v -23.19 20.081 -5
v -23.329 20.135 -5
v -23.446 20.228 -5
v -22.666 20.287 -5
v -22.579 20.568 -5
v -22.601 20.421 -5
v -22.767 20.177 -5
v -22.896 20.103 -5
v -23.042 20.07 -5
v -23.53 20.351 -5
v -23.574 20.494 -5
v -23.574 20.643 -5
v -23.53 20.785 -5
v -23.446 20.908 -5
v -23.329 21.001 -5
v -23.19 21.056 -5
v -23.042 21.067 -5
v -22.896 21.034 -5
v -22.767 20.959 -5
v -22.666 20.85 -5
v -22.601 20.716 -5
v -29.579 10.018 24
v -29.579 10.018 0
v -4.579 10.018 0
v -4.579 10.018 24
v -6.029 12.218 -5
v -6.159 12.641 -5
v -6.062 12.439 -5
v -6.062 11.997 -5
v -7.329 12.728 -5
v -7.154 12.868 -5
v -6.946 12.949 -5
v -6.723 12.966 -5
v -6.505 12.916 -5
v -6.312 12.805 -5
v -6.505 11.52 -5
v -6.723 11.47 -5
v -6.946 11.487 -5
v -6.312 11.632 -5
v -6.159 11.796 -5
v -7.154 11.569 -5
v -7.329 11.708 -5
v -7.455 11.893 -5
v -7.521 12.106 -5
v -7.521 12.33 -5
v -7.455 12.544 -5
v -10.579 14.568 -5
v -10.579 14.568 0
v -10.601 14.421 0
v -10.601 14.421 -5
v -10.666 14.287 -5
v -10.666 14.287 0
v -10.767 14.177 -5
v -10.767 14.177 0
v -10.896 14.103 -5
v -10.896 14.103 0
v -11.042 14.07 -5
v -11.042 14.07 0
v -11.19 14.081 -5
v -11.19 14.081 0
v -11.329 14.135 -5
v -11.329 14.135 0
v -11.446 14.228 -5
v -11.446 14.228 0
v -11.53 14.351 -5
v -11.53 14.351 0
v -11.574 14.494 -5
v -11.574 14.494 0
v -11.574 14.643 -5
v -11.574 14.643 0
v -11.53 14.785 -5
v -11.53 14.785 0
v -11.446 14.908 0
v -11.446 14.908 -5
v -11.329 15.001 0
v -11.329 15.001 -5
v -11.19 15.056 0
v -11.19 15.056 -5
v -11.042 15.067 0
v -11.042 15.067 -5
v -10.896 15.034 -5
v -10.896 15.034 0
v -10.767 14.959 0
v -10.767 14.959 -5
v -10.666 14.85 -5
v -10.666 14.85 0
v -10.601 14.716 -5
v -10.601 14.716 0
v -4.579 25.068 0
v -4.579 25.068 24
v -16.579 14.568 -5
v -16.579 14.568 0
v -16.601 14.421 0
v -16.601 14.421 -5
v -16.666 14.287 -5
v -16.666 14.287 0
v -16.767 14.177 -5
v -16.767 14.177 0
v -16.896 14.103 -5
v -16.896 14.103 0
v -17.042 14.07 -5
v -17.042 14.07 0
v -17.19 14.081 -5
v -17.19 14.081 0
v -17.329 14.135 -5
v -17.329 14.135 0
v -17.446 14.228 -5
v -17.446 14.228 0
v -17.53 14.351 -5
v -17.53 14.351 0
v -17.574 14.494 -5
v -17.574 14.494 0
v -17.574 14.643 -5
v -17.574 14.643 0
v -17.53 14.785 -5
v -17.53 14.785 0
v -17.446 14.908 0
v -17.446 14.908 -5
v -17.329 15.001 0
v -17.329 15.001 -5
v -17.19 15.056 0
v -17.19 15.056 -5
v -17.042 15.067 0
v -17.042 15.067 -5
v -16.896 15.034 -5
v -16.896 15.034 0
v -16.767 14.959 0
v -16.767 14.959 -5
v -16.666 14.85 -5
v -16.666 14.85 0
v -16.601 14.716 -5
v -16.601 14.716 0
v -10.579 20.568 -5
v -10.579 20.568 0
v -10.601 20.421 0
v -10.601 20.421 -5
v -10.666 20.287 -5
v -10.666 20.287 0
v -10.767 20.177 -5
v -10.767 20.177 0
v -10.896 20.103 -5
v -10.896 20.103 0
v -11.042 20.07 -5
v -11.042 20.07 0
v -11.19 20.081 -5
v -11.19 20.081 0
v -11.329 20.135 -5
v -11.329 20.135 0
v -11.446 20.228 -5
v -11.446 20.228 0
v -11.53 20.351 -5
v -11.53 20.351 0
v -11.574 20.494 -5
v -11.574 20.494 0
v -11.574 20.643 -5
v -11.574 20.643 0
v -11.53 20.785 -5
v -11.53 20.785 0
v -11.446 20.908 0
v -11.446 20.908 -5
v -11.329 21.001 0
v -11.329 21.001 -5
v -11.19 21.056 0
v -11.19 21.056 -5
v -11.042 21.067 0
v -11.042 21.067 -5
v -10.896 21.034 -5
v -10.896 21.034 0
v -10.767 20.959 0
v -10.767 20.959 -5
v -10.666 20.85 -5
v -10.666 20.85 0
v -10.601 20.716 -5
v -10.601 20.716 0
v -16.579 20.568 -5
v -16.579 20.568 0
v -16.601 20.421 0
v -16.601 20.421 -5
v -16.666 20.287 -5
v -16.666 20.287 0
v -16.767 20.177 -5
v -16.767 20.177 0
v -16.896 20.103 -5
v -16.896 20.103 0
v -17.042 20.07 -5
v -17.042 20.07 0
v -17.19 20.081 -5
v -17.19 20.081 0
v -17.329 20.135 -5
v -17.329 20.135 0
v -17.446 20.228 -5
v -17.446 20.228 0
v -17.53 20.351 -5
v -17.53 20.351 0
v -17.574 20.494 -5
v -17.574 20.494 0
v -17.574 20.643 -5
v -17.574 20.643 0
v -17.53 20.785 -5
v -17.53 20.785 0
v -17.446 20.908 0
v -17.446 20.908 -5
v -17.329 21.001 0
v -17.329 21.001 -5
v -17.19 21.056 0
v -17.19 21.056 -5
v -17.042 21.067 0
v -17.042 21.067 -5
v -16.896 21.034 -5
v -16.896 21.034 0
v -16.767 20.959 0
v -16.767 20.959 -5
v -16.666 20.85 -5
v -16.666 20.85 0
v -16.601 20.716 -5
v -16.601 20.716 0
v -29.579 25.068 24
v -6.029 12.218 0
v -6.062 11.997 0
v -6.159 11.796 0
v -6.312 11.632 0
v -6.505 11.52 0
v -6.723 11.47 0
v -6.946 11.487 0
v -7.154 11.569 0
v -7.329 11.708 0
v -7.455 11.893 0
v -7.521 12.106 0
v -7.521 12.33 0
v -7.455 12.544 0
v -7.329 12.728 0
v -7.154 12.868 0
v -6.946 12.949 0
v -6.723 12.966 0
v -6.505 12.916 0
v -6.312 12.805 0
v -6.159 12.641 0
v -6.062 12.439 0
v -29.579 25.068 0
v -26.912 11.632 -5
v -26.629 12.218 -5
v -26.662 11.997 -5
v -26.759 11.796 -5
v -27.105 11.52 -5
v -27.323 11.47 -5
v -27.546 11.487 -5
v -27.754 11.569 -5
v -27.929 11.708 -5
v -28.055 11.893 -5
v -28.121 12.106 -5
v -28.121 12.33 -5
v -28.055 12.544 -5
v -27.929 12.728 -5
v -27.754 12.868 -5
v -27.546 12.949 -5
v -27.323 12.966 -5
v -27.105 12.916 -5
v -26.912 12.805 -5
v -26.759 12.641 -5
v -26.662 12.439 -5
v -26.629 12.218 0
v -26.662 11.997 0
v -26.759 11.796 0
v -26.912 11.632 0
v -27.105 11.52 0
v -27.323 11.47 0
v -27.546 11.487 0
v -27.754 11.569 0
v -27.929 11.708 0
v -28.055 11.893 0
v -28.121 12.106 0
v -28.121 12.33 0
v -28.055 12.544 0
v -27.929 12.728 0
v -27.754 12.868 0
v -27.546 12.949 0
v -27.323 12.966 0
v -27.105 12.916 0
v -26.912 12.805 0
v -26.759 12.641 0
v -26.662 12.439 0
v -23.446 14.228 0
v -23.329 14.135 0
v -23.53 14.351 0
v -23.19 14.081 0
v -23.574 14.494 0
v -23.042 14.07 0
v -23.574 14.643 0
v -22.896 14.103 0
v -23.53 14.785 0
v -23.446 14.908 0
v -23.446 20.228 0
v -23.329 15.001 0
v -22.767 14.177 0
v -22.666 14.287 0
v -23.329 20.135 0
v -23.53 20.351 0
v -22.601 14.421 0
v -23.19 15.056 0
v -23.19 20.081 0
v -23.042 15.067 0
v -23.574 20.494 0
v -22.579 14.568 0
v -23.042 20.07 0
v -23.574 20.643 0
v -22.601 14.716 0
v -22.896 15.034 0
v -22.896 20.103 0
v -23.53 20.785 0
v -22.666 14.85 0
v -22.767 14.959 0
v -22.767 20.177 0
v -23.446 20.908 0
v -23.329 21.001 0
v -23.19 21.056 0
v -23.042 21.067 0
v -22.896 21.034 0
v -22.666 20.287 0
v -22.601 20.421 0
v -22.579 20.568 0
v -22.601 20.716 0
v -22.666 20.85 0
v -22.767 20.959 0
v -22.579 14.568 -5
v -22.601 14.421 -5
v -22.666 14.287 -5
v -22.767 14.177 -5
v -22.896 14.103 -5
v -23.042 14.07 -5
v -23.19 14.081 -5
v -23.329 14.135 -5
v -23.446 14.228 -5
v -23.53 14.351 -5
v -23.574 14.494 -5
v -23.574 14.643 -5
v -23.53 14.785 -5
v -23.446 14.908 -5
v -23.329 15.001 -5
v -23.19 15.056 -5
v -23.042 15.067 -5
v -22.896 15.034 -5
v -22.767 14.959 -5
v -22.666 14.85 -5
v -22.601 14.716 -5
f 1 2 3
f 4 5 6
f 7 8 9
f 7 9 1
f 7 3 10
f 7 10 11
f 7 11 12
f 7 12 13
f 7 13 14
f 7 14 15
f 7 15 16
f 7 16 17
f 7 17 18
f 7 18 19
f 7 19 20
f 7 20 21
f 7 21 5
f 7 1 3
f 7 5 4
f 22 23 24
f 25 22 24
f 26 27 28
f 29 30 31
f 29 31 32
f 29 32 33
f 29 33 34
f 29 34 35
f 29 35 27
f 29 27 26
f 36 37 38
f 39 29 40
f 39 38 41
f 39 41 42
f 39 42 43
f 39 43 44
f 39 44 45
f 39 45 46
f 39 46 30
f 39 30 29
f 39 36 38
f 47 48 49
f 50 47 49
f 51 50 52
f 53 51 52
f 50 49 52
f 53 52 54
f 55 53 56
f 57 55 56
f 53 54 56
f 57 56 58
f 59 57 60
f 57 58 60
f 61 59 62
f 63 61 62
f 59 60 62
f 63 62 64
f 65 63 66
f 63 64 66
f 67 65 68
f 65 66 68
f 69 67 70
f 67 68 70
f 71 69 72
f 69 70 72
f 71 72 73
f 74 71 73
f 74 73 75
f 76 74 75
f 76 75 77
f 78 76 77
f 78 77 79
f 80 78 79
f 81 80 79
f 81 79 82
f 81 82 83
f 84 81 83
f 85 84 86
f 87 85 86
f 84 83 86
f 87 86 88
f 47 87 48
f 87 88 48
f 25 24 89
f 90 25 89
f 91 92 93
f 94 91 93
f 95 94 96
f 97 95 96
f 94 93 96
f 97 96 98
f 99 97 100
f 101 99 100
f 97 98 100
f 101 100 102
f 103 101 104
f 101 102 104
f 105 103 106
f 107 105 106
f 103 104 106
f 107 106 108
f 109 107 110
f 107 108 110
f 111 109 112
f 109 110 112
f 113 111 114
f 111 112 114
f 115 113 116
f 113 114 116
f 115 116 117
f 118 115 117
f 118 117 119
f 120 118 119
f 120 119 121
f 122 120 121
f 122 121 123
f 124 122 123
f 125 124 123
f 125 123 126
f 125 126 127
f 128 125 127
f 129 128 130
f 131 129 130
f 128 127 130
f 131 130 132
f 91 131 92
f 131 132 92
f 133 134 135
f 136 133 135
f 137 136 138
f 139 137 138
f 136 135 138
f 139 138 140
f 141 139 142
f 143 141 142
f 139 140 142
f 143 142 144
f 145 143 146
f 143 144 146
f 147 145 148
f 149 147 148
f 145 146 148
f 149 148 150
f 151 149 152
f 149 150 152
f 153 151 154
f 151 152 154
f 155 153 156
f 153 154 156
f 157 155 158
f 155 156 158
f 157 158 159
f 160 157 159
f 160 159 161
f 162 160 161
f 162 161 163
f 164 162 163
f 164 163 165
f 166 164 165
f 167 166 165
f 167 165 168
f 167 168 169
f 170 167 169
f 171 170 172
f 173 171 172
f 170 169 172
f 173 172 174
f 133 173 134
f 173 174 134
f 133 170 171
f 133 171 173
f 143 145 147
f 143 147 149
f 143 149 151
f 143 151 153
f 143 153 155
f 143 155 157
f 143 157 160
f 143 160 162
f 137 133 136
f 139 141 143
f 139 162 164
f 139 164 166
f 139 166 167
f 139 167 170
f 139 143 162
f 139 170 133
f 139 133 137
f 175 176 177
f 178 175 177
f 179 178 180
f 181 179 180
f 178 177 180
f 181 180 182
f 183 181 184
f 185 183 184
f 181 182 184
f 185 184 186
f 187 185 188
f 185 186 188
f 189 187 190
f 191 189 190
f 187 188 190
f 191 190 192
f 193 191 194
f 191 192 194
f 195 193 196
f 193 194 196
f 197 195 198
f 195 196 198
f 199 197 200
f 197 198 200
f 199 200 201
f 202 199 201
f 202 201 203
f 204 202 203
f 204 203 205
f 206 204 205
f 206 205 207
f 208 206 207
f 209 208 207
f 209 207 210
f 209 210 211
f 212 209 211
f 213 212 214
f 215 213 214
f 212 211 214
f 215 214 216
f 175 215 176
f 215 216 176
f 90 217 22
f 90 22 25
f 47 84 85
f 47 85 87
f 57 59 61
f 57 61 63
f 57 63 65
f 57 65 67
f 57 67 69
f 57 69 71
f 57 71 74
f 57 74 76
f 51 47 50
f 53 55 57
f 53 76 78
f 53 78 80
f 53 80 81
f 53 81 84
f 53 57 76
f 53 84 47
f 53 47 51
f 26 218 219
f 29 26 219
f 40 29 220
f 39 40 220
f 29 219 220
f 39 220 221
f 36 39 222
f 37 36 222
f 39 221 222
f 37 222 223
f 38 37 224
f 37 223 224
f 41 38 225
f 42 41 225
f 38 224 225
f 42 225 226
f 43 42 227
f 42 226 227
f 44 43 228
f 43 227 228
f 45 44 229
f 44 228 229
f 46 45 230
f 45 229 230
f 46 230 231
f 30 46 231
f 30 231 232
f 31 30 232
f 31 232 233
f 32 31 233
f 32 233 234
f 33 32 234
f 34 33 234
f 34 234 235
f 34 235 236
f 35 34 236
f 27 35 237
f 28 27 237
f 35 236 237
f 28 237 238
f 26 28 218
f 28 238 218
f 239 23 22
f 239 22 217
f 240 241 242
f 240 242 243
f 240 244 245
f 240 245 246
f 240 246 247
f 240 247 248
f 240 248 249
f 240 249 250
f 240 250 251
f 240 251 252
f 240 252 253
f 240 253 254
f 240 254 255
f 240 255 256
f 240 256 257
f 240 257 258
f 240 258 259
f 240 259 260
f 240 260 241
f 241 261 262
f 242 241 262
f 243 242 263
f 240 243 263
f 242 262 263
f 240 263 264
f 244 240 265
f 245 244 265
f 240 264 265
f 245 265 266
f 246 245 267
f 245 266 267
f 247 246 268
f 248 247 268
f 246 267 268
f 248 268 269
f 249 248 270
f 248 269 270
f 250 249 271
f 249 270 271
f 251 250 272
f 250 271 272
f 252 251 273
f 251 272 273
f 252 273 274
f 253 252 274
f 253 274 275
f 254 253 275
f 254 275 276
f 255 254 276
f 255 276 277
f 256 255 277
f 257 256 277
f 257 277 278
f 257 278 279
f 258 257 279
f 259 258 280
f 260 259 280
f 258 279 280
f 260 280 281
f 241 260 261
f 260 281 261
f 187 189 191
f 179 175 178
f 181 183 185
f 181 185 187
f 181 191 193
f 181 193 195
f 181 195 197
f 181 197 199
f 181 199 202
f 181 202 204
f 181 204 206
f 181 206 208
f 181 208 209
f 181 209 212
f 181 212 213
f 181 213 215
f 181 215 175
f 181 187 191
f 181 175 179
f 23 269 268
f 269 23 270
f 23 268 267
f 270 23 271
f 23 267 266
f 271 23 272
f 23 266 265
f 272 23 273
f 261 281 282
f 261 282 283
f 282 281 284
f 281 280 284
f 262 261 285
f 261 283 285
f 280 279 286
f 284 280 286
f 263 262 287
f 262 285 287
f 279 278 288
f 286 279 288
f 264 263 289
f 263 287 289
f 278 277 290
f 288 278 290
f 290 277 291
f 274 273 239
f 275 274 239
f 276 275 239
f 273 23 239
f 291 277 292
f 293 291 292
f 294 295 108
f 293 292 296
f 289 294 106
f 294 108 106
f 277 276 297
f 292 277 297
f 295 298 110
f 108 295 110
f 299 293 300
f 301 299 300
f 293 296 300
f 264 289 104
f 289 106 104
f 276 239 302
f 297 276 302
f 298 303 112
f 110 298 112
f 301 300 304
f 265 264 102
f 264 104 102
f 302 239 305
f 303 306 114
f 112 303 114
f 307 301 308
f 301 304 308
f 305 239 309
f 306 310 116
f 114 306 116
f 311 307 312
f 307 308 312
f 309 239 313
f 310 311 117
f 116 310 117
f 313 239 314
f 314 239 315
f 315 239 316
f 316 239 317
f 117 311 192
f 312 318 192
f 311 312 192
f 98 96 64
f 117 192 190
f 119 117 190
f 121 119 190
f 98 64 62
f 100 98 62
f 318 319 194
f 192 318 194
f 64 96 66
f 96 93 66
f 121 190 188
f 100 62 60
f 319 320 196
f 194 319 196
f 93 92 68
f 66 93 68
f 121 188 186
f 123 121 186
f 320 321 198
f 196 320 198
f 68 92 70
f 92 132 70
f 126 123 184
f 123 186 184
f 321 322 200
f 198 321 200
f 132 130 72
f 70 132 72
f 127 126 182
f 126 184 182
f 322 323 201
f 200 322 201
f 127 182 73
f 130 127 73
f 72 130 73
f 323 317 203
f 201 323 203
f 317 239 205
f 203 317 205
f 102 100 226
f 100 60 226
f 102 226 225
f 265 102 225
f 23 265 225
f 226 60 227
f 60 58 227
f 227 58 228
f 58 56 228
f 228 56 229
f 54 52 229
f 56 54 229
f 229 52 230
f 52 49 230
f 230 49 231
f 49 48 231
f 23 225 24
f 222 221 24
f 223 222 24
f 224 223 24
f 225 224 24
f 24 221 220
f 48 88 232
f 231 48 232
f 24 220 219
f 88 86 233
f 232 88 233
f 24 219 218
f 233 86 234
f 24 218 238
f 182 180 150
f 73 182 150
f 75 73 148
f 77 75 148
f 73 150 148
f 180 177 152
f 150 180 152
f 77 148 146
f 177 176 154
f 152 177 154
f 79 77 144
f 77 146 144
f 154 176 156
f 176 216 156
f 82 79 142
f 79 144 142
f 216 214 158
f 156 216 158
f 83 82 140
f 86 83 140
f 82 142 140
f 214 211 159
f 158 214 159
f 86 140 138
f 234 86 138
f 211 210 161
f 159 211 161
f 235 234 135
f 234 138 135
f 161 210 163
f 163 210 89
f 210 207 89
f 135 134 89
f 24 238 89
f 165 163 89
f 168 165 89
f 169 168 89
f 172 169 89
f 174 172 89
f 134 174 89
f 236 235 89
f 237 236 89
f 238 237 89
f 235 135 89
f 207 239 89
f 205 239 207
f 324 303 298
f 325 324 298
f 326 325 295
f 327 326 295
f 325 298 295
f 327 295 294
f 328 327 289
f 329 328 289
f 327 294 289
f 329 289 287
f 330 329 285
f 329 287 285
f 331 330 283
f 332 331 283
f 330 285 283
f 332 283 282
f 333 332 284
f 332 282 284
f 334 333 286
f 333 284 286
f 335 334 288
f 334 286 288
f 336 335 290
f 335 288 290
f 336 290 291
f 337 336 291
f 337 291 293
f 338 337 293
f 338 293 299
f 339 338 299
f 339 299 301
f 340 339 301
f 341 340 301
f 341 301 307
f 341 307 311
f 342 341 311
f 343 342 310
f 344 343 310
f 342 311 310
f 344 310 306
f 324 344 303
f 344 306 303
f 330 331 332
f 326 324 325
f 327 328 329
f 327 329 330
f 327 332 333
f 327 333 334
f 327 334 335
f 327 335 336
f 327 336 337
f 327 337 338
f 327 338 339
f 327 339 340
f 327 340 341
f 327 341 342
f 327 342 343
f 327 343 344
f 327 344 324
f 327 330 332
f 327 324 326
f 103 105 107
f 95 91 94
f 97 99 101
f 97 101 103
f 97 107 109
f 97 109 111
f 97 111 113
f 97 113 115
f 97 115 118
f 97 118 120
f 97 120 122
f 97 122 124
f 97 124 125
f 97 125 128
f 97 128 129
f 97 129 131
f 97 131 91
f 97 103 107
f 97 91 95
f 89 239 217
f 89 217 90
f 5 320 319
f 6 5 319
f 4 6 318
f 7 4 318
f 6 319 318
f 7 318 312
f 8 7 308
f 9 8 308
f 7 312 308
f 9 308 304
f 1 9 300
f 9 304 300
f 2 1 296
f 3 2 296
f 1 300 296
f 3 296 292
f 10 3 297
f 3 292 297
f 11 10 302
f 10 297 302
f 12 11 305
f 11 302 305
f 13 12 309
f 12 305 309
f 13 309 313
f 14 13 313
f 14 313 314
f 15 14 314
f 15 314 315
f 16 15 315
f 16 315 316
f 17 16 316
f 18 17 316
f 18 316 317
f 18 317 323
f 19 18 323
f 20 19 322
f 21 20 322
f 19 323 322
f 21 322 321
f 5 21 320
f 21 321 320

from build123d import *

# Parameters (mm, degrees)
SKETCH_2_W      = 25.0000008
SKETCH_2_H      = 15.04999784
EXTRUDE_2_DEPTH = 24
SKETCH_3_R      = 0.75
SKETCH_3_R_2    = 0.5
EXTRUDE_3_DEPTH = 5


with BuildPart() as part:
    # Эскиз2 → Бобышка-Вытянуть2 (new body)
    with BuildSketch(Plane.XY):
        with Locations((-17.07912528, 17.543231945)):
            Rectangle(SKETCH_2_W, SKETCH_2_H)
    extrude(amount=EXTRUDE_2_DEPTH)

    # Эскиз3 → Бобышка-Вытянуть3 (add)
    with BuildSketch(Plane(origin=(0, 0, 0), x_dir=(-1, 0, 0), z_dir=(0, 0, -1))):
        with Locations(Location((6.77912488, 12.218233025, 0), (0, 0, 180))):
            Circle(SKETCH_3_R)
        with Locations(Location((11.07912488, 14.568230865, 0), (0, 0, 180))):
            Circle(SKETCH_3_R_2)
        with Locations(Location((17.07912558, 14.568230865, 0), (0, 0, 180))):
            Circle(SKETCH_3_R_2)
        with Locations(Location((11.07912488, 20.568230865, 0), (0, 0, 180))):
            Circle(SKETCH_3_R_2)
        with Locations(Location((17.07912558, 20.568230865, 0), (0, 0, 180))):
            Circle(SKETCH_3_R_2)
        with Locations(Location((23.07912628, 20.568230865, 0), (0, 0, 180))):
            Circle(SKETCH_3_R_2)
        with Locations(Location((23.07912628, 14.568230865, 0), (0, 0, 180))):
            Circle(SKETCH_3_R_2)
        with Locations(Location((27.37912568, 12.218233025, 0), (0, 0, 180))):
            Circle(SKETCH_3_R)
    extrude(amount=EXTRUDE_3_DEPTH)


solid = part.part
